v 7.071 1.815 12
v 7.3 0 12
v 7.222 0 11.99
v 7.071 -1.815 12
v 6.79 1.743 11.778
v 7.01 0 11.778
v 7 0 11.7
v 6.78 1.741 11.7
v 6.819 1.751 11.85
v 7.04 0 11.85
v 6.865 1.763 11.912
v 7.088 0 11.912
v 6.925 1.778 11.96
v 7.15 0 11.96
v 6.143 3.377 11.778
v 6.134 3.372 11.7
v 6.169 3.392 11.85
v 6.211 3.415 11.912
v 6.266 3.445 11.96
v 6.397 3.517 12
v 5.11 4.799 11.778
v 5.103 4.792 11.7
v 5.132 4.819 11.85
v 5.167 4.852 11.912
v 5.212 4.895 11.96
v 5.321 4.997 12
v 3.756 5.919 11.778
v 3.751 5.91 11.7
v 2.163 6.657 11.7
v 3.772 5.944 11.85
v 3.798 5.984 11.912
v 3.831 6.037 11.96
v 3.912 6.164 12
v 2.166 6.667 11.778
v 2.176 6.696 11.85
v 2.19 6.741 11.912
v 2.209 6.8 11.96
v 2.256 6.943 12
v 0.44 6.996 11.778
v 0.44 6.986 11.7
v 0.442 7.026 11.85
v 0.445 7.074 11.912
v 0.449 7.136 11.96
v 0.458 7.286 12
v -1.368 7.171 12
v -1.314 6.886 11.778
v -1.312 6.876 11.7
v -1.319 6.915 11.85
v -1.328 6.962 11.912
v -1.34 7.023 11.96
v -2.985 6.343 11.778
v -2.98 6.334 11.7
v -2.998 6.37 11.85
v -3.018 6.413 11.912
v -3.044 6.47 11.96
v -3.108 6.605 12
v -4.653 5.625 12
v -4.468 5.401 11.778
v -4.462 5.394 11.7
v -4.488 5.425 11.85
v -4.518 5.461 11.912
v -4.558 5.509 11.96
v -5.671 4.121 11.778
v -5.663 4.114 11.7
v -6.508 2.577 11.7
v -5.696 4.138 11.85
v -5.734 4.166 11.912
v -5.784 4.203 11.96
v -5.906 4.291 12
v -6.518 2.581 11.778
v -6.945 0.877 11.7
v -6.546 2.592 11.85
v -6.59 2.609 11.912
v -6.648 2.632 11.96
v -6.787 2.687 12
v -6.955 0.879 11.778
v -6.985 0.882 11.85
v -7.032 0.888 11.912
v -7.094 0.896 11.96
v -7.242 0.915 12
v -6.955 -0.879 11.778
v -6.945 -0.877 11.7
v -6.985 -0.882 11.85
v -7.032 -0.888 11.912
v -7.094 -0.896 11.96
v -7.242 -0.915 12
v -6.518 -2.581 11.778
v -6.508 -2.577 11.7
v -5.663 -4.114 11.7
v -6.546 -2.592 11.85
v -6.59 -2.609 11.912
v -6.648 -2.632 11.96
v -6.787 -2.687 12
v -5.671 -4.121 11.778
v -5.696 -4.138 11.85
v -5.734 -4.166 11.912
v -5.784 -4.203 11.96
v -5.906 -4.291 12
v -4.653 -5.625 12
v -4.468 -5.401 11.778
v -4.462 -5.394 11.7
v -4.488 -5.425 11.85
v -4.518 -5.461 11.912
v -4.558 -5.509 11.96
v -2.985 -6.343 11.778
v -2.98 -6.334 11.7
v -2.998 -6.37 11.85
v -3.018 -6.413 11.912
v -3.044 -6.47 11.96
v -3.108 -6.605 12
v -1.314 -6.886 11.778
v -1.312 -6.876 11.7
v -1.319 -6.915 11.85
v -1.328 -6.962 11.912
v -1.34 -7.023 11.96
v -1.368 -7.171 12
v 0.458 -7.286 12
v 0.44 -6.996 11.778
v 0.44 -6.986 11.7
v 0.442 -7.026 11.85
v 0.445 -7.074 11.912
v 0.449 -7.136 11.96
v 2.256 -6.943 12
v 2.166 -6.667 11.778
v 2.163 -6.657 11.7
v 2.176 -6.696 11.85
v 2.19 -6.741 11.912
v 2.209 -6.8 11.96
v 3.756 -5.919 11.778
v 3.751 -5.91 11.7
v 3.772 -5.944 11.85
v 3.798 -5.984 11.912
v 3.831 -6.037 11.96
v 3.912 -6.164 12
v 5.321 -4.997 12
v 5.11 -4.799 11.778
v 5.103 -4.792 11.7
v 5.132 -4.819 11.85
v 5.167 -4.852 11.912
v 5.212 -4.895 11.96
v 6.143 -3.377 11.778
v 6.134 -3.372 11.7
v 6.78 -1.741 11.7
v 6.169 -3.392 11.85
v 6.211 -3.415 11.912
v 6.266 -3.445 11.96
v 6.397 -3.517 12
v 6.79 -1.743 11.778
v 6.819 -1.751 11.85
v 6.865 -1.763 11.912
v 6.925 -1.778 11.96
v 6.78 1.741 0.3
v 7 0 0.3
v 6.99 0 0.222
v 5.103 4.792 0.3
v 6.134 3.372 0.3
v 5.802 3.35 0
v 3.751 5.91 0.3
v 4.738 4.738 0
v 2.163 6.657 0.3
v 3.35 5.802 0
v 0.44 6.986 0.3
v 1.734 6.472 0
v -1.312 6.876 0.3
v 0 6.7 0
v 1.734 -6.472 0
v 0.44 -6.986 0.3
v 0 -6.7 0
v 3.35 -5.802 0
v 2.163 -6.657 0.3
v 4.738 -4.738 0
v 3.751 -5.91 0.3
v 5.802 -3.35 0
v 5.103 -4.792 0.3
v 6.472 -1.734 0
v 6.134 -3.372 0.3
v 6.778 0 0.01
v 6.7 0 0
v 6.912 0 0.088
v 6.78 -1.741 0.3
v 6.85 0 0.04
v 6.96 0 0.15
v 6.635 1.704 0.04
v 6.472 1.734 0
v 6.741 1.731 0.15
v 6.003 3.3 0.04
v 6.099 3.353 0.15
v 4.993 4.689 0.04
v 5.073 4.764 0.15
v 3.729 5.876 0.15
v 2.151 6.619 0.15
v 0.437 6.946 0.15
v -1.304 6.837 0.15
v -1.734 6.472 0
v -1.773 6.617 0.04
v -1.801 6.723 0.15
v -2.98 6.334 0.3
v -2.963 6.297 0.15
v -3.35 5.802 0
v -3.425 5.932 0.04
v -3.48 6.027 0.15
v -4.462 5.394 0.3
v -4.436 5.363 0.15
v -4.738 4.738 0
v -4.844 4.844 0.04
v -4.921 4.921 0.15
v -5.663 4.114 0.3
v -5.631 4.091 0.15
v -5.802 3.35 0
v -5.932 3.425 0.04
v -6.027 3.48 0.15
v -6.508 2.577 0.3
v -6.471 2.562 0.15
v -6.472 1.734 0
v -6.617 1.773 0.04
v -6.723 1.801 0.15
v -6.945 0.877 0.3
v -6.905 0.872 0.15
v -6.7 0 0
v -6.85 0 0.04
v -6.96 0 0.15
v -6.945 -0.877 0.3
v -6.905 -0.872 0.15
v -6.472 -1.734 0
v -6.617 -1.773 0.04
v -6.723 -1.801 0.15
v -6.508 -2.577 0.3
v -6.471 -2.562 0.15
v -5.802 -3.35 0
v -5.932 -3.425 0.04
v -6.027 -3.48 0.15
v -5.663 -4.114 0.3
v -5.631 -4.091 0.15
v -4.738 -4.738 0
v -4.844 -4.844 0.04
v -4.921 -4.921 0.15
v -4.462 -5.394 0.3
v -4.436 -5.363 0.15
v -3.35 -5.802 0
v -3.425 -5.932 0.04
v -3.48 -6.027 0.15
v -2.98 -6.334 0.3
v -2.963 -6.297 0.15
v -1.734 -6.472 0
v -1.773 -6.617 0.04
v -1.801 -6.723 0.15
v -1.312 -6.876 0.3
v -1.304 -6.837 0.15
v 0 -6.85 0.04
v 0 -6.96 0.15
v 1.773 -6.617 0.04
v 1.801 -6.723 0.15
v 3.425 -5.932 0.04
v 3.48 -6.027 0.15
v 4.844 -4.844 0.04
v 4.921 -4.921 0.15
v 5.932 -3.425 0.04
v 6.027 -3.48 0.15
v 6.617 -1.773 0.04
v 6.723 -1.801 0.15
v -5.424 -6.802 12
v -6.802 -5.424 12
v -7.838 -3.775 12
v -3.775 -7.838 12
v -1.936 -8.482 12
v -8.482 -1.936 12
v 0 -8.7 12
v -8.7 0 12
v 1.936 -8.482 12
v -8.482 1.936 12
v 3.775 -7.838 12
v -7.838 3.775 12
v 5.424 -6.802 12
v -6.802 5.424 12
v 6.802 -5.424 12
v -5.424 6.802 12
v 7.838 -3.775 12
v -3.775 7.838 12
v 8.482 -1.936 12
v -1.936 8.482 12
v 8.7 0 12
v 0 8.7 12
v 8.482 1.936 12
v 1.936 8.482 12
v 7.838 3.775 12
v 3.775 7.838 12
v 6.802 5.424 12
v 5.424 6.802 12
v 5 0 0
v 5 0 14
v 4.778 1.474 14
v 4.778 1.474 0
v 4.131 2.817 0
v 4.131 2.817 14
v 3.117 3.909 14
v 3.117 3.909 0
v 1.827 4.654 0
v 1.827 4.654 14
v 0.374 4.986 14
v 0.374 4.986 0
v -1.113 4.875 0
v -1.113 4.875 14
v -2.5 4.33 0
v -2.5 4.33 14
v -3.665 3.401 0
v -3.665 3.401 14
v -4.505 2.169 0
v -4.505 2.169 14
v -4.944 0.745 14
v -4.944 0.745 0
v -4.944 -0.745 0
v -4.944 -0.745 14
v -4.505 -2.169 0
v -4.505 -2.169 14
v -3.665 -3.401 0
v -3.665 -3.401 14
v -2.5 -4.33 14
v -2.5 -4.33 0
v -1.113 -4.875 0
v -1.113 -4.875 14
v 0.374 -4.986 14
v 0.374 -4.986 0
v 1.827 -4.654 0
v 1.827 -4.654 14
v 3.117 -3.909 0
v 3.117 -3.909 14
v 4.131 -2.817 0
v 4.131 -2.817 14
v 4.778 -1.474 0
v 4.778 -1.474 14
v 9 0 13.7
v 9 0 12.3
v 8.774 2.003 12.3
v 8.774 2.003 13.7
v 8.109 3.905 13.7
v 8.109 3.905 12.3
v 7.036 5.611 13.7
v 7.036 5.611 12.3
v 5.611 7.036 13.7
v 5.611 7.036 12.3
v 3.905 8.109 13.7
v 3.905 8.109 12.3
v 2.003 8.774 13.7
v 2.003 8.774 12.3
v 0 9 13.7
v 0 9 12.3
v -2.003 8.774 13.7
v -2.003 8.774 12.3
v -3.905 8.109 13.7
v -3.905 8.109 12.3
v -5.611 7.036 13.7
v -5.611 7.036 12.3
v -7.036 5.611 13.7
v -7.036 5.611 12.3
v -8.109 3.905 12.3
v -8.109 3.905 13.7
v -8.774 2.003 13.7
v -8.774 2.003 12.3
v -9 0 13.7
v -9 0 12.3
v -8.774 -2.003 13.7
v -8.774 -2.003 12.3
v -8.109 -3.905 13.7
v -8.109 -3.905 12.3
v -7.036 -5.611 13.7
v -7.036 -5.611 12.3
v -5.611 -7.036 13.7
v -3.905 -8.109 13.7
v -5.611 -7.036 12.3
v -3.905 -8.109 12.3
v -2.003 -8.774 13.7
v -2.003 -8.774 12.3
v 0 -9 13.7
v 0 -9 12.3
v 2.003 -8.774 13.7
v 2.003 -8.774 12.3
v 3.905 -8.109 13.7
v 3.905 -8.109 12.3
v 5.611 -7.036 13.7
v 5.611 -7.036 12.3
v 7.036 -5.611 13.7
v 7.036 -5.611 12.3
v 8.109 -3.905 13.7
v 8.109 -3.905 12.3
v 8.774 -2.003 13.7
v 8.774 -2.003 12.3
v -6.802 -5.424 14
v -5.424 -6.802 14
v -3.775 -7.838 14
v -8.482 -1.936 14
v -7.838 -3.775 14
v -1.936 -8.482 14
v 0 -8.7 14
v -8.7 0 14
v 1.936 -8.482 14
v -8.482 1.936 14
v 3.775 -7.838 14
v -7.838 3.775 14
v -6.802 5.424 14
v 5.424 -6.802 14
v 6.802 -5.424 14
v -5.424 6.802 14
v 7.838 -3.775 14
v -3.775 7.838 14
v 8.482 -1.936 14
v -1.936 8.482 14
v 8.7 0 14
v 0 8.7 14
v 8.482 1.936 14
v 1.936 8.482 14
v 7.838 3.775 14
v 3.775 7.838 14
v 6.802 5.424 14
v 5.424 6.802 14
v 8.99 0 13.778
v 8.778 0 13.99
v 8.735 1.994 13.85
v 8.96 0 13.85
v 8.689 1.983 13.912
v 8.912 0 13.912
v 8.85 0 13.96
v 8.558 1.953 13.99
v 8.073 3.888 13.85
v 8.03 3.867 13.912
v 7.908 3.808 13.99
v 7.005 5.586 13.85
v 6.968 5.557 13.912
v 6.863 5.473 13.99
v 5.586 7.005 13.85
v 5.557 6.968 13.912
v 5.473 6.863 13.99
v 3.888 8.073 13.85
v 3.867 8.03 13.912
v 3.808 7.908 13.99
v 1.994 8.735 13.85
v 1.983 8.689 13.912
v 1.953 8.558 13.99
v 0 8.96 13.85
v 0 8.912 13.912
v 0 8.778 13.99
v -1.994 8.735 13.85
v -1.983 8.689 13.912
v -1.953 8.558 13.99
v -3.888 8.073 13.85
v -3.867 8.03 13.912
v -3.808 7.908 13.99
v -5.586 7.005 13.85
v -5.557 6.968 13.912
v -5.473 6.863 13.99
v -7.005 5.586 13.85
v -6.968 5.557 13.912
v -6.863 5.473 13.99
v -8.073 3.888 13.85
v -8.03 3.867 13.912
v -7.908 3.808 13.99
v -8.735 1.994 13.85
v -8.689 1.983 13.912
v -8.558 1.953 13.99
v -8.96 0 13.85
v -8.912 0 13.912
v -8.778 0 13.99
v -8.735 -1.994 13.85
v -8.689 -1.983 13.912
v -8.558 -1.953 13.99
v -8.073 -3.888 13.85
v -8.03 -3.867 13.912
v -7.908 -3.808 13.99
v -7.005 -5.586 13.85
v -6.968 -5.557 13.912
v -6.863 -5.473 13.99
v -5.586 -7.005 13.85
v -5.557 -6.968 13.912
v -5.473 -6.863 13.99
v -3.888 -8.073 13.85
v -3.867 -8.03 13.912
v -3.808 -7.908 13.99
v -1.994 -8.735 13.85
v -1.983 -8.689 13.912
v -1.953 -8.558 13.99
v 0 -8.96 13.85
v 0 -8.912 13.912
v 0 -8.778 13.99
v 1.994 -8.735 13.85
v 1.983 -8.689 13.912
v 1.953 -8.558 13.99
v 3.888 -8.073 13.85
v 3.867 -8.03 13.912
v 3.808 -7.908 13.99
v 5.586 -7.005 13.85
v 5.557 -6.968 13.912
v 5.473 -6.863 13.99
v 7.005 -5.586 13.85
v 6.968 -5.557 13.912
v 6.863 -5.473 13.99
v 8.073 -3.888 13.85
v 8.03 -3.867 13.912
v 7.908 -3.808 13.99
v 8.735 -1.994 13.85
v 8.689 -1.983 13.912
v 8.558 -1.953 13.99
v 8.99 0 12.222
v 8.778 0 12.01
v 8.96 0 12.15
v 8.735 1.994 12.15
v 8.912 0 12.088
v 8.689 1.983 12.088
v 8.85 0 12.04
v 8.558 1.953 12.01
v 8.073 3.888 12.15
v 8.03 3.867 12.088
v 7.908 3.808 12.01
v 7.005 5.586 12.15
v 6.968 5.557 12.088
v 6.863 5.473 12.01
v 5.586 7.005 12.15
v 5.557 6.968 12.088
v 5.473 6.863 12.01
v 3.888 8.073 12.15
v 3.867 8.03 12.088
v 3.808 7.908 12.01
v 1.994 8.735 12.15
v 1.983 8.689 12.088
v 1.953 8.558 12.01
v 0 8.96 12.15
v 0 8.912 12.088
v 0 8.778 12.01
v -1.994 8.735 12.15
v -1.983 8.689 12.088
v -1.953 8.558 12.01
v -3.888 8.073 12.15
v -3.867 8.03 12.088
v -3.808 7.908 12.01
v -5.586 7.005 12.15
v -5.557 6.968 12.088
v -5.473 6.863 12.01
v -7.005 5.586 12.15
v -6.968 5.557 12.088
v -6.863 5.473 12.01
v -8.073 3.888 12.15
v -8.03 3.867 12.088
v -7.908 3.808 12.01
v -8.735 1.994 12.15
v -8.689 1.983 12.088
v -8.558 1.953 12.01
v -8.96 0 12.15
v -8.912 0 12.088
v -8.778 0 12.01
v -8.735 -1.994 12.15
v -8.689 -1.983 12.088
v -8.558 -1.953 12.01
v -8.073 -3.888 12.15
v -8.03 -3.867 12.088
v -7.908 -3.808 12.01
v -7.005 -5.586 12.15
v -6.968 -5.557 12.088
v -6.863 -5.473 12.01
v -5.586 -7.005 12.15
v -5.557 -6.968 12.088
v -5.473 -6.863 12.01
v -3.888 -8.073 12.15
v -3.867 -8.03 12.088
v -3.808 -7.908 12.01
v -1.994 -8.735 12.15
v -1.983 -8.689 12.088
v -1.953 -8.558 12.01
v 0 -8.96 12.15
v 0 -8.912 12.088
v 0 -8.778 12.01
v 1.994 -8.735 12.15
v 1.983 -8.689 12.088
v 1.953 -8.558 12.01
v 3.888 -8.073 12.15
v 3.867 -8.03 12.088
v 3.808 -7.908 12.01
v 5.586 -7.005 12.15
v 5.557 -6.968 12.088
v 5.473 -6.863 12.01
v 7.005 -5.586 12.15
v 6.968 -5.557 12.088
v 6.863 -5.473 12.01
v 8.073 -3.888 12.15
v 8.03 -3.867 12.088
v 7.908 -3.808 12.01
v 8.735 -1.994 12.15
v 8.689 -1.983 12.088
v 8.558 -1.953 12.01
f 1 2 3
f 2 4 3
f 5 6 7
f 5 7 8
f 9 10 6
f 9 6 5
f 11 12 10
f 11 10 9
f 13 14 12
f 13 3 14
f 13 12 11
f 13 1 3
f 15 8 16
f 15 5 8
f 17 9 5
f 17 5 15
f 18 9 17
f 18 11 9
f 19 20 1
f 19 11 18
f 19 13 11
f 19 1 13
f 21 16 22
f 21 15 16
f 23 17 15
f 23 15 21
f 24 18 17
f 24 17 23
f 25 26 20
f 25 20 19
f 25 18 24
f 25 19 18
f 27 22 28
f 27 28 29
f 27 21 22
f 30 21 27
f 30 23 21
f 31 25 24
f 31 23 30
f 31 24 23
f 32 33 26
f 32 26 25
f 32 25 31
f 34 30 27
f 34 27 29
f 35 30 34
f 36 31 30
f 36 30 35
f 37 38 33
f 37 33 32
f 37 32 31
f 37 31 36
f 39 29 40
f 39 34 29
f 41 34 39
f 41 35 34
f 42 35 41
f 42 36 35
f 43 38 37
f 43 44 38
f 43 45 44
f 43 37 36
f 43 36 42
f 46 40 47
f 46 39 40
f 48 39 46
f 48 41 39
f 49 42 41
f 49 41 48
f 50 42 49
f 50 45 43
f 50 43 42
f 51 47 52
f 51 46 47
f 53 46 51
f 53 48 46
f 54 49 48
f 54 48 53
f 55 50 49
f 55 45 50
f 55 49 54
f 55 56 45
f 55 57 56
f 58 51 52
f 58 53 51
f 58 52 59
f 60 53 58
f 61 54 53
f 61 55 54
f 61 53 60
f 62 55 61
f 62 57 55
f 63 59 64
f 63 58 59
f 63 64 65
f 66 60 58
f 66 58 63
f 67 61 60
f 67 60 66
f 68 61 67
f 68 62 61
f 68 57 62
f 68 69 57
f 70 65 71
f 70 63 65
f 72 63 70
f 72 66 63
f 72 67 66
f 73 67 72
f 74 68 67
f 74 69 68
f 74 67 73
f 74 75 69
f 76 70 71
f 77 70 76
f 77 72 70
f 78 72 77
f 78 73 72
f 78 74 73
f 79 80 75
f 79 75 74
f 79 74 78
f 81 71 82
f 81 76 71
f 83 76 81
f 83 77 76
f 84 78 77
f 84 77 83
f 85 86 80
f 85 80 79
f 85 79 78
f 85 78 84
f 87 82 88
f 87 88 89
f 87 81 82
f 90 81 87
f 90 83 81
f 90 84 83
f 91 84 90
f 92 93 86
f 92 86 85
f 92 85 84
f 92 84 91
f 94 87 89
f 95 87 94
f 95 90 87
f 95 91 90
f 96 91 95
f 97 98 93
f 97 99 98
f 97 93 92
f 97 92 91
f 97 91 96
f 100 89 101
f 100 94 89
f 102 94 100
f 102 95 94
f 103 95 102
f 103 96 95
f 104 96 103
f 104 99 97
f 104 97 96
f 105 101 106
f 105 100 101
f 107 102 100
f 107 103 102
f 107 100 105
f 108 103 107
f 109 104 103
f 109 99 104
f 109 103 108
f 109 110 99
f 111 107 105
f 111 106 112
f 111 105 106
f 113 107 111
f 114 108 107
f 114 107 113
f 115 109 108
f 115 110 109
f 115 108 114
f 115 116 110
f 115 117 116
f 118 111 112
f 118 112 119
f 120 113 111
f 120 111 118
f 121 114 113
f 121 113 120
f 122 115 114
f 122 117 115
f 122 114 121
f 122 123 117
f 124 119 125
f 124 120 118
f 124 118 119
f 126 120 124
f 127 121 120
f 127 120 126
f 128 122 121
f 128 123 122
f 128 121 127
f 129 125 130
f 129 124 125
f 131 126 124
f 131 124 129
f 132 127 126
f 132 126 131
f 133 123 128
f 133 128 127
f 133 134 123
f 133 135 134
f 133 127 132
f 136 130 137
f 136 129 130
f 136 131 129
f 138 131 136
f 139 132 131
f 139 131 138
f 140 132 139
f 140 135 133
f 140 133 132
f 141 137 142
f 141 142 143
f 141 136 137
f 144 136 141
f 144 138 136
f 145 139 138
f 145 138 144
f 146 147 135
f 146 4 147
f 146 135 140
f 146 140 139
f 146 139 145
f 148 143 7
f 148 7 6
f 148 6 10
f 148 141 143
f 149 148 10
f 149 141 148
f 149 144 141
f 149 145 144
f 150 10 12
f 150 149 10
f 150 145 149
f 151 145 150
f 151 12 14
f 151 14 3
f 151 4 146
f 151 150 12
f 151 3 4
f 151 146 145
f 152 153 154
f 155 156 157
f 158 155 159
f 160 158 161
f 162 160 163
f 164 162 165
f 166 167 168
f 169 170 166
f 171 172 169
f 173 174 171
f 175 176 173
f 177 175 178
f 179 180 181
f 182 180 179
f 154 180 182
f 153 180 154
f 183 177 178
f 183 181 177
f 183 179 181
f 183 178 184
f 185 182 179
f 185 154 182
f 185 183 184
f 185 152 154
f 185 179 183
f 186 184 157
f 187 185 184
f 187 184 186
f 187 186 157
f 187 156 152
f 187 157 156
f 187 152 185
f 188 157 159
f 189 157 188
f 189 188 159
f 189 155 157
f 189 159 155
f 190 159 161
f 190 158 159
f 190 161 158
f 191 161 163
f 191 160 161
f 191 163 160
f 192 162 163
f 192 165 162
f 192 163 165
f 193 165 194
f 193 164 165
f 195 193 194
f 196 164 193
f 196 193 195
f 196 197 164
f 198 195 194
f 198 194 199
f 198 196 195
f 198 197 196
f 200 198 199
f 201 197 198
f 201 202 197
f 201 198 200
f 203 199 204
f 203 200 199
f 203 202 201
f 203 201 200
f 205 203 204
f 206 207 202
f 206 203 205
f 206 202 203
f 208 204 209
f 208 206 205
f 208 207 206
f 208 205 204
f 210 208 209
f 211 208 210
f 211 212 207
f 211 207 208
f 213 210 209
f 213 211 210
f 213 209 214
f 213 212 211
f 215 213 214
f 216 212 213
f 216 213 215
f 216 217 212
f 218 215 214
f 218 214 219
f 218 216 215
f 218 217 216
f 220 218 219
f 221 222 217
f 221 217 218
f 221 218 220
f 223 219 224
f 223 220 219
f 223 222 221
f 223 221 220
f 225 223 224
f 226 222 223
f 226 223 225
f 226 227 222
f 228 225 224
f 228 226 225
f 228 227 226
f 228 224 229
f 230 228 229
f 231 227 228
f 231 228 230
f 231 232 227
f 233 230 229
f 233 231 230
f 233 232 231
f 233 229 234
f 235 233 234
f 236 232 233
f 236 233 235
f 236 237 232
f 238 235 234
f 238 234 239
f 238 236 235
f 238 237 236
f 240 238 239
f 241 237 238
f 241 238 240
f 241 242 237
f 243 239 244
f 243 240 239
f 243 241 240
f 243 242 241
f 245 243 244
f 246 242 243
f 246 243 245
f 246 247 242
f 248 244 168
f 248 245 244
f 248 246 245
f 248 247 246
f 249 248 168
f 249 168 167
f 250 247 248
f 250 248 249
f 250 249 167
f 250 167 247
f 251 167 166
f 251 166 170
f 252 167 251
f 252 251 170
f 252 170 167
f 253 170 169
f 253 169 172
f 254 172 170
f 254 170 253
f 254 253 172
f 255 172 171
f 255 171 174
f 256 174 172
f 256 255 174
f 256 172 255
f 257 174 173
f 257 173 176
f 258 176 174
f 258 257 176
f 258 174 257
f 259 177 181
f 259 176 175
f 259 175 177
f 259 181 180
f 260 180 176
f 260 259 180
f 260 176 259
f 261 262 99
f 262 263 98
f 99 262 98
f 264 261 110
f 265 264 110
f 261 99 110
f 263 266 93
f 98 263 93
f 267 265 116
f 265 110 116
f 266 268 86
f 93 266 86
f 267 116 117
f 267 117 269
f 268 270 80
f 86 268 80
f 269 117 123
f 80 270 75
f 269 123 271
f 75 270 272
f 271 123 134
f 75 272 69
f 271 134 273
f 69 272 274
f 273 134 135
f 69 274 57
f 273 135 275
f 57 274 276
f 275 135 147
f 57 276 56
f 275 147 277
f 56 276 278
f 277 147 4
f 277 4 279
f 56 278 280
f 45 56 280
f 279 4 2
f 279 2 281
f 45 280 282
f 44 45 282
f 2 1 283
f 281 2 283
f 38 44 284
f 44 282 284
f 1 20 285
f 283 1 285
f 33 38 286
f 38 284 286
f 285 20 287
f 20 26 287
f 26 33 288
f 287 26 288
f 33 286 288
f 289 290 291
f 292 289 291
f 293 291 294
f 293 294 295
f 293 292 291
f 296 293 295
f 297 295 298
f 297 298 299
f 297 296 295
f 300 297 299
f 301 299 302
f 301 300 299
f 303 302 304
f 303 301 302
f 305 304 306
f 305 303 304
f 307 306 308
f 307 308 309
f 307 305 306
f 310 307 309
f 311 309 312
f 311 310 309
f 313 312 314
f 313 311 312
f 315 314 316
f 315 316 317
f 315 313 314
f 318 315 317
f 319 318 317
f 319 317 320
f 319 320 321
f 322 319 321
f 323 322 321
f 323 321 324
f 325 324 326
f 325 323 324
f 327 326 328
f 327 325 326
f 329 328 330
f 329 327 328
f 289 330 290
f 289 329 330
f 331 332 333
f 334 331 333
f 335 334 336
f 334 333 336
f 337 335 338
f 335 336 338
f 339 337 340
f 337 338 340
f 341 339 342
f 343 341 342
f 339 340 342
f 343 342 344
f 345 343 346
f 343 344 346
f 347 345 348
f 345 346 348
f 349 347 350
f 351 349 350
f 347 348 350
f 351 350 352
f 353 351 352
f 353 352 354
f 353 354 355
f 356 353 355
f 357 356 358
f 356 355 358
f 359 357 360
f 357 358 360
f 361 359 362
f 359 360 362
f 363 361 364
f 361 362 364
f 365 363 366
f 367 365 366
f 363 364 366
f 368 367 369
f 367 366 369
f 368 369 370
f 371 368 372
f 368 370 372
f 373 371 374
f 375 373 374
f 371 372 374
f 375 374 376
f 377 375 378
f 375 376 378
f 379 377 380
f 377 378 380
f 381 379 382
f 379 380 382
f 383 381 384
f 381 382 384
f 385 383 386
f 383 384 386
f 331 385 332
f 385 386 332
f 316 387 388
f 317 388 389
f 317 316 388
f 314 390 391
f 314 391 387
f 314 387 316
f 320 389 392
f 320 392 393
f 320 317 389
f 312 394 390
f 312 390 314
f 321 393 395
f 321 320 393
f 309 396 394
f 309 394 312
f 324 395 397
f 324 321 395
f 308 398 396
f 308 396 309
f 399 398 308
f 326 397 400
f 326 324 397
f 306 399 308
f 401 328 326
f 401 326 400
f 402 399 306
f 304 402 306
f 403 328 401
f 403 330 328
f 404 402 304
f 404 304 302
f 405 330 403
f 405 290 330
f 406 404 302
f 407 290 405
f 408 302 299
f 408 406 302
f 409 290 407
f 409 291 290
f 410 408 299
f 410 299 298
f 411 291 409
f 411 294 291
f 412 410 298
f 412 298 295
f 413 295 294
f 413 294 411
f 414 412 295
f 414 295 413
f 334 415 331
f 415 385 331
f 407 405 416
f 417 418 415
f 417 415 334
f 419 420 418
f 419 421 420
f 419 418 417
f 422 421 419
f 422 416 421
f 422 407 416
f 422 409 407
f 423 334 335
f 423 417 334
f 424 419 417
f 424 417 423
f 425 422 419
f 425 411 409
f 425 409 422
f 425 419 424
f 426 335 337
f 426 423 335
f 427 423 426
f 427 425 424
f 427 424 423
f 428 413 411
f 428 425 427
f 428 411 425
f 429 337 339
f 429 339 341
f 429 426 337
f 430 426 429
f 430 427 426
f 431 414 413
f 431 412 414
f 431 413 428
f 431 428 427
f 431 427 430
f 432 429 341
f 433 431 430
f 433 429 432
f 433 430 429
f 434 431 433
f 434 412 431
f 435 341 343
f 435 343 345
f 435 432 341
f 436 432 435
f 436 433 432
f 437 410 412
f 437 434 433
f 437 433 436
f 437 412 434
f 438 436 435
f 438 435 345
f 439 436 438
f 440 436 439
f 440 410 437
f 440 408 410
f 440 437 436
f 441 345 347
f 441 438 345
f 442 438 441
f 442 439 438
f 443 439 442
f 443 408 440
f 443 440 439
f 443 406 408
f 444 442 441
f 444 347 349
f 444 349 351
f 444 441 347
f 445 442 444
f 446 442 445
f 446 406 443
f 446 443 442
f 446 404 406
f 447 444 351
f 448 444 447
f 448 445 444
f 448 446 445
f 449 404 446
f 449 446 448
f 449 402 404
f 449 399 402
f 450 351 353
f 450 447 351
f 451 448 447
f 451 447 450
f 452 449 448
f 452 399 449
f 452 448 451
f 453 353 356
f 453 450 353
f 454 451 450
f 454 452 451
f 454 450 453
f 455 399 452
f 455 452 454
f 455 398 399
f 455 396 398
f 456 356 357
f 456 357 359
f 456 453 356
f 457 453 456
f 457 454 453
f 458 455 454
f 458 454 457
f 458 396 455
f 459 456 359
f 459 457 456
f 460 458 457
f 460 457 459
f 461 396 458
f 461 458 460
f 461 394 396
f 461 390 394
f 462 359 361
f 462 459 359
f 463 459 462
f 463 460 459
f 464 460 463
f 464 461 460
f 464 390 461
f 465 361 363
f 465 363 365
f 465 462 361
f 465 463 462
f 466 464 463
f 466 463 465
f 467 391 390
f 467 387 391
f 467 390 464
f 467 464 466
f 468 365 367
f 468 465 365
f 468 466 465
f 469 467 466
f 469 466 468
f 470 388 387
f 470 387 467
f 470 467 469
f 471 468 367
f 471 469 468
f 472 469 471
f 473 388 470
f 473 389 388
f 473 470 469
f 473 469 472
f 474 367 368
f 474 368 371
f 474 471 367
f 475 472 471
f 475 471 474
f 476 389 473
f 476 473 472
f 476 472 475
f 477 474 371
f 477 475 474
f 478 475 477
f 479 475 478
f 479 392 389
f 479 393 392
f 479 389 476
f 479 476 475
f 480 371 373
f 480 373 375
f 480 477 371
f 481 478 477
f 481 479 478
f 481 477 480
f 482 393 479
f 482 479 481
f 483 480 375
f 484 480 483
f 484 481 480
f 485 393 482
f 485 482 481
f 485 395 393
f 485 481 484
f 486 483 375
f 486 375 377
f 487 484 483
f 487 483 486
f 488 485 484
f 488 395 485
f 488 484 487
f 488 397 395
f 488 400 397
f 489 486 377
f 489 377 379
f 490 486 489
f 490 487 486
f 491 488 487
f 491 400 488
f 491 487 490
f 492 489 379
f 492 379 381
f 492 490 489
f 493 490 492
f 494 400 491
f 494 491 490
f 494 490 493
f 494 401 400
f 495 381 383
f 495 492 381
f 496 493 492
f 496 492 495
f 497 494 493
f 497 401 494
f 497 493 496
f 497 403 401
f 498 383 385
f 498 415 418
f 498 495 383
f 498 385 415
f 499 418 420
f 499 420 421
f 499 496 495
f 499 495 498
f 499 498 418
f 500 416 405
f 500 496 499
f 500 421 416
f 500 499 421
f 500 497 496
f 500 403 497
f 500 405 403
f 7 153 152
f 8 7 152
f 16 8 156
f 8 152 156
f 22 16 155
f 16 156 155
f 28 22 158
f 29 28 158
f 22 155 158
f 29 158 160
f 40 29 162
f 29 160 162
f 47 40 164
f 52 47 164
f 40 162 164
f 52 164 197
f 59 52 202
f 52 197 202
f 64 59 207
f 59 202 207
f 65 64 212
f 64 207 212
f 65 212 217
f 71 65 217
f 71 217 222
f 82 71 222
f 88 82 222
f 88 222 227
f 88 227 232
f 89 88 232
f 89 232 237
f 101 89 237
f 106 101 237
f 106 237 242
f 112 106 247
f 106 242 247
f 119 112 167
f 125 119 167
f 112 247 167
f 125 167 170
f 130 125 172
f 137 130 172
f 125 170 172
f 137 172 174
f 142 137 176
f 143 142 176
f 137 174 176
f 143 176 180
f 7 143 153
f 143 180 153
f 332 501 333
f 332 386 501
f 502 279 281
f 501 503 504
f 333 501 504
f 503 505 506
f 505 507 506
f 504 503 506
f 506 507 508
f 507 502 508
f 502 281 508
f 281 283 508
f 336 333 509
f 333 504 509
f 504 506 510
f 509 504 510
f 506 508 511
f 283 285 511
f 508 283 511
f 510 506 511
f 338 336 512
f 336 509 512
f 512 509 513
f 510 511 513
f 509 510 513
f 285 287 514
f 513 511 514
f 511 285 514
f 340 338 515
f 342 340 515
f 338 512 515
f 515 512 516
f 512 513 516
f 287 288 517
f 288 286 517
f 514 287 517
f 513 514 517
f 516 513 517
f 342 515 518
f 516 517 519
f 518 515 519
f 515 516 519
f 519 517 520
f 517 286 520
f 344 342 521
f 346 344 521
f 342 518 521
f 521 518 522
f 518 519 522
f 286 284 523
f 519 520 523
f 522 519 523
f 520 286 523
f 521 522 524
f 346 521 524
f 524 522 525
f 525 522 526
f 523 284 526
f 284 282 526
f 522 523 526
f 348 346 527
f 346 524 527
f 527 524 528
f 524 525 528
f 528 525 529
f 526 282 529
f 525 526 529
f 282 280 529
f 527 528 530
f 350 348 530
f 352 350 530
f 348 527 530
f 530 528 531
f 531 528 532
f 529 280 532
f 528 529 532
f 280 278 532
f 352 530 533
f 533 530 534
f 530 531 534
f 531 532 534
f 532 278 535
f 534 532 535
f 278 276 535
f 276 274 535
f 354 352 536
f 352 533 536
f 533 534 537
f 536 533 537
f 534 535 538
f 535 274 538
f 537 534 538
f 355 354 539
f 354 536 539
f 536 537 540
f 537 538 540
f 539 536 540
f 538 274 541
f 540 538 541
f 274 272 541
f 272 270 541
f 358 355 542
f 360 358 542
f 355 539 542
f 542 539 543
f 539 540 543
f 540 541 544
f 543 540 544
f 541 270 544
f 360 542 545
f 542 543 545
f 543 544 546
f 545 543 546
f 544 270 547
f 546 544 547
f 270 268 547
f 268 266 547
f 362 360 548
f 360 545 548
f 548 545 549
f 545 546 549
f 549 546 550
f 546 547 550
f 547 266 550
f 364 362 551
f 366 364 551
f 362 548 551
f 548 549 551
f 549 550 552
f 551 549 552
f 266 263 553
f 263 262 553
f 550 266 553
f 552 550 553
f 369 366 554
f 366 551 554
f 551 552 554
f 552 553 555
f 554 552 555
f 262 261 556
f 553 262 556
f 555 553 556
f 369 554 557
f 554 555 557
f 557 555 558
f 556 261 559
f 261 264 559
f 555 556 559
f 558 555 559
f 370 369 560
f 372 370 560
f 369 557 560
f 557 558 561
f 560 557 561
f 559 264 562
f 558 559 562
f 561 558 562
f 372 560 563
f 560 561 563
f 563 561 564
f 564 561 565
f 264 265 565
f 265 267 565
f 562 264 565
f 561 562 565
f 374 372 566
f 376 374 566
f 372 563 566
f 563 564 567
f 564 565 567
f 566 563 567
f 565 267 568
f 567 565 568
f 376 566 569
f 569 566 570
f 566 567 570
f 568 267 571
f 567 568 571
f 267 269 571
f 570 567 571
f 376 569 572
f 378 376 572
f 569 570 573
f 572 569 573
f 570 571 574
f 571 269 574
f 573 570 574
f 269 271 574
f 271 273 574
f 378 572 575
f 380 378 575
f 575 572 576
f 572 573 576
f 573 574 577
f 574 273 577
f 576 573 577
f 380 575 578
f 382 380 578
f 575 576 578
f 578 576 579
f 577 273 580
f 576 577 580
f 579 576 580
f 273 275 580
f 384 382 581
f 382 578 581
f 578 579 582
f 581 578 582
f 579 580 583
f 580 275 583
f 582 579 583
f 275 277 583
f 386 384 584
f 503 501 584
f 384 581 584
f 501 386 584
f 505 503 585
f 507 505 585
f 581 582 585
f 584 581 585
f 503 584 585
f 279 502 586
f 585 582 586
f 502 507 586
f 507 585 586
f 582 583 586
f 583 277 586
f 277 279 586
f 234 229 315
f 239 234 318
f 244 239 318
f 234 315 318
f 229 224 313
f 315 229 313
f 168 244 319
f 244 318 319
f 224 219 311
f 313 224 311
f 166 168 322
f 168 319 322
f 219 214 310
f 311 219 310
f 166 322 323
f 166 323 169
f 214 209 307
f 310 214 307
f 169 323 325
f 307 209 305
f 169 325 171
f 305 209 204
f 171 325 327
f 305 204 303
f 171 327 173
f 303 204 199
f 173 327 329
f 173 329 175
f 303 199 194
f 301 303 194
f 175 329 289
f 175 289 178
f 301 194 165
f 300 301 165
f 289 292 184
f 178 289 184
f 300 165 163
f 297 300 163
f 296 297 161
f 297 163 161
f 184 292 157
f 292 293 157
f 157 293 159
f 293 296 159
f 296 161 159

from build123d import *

# Parameters (mm, degrees)
SKETCH1_R           = 7
SKETCH1_R_2         = 5
BOSS_EXTRUDE1_DEPTH = 12
SKETCH2_R           = 9
SKETCH2_R_2         = 7
SKETCH2_R_3         = 5
BOSS_EXTRUDE2_DEPTH = 2
FILLET1_R           = 0.3


with BuildPart() as part:
    # Sketch1 → Boss-Extrude1 (new body)
    with BuildSketch(Plane.XY):
        Circle(SKETCH1_R)
        Circle(SKETCH1_R_2, mode=Mode.SUBTRACT)
    extrude(amount=BOSS_EXTRUDE1_DEPTH)

    # Sketch2 → Boss-Extrude2 (add)
    # profile 1 of 2: a face of its own
    with BuildSketch(Plane.XY.offset(12)):
        Circle(SKETCH2_R)
        Circle(SKETCH2_R_2, mode=Mode.SUBTRACT)
    # profile 2 of 2: a face of its own
    with BuildSketch(Plane.XY.offset(12)):
        Circle(SKETCH2_R_2)
        Circle(SKETCH2_R_3, mode=Mode.SUBTRACT)
    extrude(amount=BOSS_EXTRUDE2_DEPTH)

    # Fillet1
    fillet1_edges = [part.edges().sort_by_distance(p)[0] for p in [
        (-9, 0, 12),
        (-9, 0, 14),
        (-7, 0, 0),
        (-7, 0, 12),
    ]]
    fillet(fillet1_edges, radius=FILLET1_R)


solid = part.part
